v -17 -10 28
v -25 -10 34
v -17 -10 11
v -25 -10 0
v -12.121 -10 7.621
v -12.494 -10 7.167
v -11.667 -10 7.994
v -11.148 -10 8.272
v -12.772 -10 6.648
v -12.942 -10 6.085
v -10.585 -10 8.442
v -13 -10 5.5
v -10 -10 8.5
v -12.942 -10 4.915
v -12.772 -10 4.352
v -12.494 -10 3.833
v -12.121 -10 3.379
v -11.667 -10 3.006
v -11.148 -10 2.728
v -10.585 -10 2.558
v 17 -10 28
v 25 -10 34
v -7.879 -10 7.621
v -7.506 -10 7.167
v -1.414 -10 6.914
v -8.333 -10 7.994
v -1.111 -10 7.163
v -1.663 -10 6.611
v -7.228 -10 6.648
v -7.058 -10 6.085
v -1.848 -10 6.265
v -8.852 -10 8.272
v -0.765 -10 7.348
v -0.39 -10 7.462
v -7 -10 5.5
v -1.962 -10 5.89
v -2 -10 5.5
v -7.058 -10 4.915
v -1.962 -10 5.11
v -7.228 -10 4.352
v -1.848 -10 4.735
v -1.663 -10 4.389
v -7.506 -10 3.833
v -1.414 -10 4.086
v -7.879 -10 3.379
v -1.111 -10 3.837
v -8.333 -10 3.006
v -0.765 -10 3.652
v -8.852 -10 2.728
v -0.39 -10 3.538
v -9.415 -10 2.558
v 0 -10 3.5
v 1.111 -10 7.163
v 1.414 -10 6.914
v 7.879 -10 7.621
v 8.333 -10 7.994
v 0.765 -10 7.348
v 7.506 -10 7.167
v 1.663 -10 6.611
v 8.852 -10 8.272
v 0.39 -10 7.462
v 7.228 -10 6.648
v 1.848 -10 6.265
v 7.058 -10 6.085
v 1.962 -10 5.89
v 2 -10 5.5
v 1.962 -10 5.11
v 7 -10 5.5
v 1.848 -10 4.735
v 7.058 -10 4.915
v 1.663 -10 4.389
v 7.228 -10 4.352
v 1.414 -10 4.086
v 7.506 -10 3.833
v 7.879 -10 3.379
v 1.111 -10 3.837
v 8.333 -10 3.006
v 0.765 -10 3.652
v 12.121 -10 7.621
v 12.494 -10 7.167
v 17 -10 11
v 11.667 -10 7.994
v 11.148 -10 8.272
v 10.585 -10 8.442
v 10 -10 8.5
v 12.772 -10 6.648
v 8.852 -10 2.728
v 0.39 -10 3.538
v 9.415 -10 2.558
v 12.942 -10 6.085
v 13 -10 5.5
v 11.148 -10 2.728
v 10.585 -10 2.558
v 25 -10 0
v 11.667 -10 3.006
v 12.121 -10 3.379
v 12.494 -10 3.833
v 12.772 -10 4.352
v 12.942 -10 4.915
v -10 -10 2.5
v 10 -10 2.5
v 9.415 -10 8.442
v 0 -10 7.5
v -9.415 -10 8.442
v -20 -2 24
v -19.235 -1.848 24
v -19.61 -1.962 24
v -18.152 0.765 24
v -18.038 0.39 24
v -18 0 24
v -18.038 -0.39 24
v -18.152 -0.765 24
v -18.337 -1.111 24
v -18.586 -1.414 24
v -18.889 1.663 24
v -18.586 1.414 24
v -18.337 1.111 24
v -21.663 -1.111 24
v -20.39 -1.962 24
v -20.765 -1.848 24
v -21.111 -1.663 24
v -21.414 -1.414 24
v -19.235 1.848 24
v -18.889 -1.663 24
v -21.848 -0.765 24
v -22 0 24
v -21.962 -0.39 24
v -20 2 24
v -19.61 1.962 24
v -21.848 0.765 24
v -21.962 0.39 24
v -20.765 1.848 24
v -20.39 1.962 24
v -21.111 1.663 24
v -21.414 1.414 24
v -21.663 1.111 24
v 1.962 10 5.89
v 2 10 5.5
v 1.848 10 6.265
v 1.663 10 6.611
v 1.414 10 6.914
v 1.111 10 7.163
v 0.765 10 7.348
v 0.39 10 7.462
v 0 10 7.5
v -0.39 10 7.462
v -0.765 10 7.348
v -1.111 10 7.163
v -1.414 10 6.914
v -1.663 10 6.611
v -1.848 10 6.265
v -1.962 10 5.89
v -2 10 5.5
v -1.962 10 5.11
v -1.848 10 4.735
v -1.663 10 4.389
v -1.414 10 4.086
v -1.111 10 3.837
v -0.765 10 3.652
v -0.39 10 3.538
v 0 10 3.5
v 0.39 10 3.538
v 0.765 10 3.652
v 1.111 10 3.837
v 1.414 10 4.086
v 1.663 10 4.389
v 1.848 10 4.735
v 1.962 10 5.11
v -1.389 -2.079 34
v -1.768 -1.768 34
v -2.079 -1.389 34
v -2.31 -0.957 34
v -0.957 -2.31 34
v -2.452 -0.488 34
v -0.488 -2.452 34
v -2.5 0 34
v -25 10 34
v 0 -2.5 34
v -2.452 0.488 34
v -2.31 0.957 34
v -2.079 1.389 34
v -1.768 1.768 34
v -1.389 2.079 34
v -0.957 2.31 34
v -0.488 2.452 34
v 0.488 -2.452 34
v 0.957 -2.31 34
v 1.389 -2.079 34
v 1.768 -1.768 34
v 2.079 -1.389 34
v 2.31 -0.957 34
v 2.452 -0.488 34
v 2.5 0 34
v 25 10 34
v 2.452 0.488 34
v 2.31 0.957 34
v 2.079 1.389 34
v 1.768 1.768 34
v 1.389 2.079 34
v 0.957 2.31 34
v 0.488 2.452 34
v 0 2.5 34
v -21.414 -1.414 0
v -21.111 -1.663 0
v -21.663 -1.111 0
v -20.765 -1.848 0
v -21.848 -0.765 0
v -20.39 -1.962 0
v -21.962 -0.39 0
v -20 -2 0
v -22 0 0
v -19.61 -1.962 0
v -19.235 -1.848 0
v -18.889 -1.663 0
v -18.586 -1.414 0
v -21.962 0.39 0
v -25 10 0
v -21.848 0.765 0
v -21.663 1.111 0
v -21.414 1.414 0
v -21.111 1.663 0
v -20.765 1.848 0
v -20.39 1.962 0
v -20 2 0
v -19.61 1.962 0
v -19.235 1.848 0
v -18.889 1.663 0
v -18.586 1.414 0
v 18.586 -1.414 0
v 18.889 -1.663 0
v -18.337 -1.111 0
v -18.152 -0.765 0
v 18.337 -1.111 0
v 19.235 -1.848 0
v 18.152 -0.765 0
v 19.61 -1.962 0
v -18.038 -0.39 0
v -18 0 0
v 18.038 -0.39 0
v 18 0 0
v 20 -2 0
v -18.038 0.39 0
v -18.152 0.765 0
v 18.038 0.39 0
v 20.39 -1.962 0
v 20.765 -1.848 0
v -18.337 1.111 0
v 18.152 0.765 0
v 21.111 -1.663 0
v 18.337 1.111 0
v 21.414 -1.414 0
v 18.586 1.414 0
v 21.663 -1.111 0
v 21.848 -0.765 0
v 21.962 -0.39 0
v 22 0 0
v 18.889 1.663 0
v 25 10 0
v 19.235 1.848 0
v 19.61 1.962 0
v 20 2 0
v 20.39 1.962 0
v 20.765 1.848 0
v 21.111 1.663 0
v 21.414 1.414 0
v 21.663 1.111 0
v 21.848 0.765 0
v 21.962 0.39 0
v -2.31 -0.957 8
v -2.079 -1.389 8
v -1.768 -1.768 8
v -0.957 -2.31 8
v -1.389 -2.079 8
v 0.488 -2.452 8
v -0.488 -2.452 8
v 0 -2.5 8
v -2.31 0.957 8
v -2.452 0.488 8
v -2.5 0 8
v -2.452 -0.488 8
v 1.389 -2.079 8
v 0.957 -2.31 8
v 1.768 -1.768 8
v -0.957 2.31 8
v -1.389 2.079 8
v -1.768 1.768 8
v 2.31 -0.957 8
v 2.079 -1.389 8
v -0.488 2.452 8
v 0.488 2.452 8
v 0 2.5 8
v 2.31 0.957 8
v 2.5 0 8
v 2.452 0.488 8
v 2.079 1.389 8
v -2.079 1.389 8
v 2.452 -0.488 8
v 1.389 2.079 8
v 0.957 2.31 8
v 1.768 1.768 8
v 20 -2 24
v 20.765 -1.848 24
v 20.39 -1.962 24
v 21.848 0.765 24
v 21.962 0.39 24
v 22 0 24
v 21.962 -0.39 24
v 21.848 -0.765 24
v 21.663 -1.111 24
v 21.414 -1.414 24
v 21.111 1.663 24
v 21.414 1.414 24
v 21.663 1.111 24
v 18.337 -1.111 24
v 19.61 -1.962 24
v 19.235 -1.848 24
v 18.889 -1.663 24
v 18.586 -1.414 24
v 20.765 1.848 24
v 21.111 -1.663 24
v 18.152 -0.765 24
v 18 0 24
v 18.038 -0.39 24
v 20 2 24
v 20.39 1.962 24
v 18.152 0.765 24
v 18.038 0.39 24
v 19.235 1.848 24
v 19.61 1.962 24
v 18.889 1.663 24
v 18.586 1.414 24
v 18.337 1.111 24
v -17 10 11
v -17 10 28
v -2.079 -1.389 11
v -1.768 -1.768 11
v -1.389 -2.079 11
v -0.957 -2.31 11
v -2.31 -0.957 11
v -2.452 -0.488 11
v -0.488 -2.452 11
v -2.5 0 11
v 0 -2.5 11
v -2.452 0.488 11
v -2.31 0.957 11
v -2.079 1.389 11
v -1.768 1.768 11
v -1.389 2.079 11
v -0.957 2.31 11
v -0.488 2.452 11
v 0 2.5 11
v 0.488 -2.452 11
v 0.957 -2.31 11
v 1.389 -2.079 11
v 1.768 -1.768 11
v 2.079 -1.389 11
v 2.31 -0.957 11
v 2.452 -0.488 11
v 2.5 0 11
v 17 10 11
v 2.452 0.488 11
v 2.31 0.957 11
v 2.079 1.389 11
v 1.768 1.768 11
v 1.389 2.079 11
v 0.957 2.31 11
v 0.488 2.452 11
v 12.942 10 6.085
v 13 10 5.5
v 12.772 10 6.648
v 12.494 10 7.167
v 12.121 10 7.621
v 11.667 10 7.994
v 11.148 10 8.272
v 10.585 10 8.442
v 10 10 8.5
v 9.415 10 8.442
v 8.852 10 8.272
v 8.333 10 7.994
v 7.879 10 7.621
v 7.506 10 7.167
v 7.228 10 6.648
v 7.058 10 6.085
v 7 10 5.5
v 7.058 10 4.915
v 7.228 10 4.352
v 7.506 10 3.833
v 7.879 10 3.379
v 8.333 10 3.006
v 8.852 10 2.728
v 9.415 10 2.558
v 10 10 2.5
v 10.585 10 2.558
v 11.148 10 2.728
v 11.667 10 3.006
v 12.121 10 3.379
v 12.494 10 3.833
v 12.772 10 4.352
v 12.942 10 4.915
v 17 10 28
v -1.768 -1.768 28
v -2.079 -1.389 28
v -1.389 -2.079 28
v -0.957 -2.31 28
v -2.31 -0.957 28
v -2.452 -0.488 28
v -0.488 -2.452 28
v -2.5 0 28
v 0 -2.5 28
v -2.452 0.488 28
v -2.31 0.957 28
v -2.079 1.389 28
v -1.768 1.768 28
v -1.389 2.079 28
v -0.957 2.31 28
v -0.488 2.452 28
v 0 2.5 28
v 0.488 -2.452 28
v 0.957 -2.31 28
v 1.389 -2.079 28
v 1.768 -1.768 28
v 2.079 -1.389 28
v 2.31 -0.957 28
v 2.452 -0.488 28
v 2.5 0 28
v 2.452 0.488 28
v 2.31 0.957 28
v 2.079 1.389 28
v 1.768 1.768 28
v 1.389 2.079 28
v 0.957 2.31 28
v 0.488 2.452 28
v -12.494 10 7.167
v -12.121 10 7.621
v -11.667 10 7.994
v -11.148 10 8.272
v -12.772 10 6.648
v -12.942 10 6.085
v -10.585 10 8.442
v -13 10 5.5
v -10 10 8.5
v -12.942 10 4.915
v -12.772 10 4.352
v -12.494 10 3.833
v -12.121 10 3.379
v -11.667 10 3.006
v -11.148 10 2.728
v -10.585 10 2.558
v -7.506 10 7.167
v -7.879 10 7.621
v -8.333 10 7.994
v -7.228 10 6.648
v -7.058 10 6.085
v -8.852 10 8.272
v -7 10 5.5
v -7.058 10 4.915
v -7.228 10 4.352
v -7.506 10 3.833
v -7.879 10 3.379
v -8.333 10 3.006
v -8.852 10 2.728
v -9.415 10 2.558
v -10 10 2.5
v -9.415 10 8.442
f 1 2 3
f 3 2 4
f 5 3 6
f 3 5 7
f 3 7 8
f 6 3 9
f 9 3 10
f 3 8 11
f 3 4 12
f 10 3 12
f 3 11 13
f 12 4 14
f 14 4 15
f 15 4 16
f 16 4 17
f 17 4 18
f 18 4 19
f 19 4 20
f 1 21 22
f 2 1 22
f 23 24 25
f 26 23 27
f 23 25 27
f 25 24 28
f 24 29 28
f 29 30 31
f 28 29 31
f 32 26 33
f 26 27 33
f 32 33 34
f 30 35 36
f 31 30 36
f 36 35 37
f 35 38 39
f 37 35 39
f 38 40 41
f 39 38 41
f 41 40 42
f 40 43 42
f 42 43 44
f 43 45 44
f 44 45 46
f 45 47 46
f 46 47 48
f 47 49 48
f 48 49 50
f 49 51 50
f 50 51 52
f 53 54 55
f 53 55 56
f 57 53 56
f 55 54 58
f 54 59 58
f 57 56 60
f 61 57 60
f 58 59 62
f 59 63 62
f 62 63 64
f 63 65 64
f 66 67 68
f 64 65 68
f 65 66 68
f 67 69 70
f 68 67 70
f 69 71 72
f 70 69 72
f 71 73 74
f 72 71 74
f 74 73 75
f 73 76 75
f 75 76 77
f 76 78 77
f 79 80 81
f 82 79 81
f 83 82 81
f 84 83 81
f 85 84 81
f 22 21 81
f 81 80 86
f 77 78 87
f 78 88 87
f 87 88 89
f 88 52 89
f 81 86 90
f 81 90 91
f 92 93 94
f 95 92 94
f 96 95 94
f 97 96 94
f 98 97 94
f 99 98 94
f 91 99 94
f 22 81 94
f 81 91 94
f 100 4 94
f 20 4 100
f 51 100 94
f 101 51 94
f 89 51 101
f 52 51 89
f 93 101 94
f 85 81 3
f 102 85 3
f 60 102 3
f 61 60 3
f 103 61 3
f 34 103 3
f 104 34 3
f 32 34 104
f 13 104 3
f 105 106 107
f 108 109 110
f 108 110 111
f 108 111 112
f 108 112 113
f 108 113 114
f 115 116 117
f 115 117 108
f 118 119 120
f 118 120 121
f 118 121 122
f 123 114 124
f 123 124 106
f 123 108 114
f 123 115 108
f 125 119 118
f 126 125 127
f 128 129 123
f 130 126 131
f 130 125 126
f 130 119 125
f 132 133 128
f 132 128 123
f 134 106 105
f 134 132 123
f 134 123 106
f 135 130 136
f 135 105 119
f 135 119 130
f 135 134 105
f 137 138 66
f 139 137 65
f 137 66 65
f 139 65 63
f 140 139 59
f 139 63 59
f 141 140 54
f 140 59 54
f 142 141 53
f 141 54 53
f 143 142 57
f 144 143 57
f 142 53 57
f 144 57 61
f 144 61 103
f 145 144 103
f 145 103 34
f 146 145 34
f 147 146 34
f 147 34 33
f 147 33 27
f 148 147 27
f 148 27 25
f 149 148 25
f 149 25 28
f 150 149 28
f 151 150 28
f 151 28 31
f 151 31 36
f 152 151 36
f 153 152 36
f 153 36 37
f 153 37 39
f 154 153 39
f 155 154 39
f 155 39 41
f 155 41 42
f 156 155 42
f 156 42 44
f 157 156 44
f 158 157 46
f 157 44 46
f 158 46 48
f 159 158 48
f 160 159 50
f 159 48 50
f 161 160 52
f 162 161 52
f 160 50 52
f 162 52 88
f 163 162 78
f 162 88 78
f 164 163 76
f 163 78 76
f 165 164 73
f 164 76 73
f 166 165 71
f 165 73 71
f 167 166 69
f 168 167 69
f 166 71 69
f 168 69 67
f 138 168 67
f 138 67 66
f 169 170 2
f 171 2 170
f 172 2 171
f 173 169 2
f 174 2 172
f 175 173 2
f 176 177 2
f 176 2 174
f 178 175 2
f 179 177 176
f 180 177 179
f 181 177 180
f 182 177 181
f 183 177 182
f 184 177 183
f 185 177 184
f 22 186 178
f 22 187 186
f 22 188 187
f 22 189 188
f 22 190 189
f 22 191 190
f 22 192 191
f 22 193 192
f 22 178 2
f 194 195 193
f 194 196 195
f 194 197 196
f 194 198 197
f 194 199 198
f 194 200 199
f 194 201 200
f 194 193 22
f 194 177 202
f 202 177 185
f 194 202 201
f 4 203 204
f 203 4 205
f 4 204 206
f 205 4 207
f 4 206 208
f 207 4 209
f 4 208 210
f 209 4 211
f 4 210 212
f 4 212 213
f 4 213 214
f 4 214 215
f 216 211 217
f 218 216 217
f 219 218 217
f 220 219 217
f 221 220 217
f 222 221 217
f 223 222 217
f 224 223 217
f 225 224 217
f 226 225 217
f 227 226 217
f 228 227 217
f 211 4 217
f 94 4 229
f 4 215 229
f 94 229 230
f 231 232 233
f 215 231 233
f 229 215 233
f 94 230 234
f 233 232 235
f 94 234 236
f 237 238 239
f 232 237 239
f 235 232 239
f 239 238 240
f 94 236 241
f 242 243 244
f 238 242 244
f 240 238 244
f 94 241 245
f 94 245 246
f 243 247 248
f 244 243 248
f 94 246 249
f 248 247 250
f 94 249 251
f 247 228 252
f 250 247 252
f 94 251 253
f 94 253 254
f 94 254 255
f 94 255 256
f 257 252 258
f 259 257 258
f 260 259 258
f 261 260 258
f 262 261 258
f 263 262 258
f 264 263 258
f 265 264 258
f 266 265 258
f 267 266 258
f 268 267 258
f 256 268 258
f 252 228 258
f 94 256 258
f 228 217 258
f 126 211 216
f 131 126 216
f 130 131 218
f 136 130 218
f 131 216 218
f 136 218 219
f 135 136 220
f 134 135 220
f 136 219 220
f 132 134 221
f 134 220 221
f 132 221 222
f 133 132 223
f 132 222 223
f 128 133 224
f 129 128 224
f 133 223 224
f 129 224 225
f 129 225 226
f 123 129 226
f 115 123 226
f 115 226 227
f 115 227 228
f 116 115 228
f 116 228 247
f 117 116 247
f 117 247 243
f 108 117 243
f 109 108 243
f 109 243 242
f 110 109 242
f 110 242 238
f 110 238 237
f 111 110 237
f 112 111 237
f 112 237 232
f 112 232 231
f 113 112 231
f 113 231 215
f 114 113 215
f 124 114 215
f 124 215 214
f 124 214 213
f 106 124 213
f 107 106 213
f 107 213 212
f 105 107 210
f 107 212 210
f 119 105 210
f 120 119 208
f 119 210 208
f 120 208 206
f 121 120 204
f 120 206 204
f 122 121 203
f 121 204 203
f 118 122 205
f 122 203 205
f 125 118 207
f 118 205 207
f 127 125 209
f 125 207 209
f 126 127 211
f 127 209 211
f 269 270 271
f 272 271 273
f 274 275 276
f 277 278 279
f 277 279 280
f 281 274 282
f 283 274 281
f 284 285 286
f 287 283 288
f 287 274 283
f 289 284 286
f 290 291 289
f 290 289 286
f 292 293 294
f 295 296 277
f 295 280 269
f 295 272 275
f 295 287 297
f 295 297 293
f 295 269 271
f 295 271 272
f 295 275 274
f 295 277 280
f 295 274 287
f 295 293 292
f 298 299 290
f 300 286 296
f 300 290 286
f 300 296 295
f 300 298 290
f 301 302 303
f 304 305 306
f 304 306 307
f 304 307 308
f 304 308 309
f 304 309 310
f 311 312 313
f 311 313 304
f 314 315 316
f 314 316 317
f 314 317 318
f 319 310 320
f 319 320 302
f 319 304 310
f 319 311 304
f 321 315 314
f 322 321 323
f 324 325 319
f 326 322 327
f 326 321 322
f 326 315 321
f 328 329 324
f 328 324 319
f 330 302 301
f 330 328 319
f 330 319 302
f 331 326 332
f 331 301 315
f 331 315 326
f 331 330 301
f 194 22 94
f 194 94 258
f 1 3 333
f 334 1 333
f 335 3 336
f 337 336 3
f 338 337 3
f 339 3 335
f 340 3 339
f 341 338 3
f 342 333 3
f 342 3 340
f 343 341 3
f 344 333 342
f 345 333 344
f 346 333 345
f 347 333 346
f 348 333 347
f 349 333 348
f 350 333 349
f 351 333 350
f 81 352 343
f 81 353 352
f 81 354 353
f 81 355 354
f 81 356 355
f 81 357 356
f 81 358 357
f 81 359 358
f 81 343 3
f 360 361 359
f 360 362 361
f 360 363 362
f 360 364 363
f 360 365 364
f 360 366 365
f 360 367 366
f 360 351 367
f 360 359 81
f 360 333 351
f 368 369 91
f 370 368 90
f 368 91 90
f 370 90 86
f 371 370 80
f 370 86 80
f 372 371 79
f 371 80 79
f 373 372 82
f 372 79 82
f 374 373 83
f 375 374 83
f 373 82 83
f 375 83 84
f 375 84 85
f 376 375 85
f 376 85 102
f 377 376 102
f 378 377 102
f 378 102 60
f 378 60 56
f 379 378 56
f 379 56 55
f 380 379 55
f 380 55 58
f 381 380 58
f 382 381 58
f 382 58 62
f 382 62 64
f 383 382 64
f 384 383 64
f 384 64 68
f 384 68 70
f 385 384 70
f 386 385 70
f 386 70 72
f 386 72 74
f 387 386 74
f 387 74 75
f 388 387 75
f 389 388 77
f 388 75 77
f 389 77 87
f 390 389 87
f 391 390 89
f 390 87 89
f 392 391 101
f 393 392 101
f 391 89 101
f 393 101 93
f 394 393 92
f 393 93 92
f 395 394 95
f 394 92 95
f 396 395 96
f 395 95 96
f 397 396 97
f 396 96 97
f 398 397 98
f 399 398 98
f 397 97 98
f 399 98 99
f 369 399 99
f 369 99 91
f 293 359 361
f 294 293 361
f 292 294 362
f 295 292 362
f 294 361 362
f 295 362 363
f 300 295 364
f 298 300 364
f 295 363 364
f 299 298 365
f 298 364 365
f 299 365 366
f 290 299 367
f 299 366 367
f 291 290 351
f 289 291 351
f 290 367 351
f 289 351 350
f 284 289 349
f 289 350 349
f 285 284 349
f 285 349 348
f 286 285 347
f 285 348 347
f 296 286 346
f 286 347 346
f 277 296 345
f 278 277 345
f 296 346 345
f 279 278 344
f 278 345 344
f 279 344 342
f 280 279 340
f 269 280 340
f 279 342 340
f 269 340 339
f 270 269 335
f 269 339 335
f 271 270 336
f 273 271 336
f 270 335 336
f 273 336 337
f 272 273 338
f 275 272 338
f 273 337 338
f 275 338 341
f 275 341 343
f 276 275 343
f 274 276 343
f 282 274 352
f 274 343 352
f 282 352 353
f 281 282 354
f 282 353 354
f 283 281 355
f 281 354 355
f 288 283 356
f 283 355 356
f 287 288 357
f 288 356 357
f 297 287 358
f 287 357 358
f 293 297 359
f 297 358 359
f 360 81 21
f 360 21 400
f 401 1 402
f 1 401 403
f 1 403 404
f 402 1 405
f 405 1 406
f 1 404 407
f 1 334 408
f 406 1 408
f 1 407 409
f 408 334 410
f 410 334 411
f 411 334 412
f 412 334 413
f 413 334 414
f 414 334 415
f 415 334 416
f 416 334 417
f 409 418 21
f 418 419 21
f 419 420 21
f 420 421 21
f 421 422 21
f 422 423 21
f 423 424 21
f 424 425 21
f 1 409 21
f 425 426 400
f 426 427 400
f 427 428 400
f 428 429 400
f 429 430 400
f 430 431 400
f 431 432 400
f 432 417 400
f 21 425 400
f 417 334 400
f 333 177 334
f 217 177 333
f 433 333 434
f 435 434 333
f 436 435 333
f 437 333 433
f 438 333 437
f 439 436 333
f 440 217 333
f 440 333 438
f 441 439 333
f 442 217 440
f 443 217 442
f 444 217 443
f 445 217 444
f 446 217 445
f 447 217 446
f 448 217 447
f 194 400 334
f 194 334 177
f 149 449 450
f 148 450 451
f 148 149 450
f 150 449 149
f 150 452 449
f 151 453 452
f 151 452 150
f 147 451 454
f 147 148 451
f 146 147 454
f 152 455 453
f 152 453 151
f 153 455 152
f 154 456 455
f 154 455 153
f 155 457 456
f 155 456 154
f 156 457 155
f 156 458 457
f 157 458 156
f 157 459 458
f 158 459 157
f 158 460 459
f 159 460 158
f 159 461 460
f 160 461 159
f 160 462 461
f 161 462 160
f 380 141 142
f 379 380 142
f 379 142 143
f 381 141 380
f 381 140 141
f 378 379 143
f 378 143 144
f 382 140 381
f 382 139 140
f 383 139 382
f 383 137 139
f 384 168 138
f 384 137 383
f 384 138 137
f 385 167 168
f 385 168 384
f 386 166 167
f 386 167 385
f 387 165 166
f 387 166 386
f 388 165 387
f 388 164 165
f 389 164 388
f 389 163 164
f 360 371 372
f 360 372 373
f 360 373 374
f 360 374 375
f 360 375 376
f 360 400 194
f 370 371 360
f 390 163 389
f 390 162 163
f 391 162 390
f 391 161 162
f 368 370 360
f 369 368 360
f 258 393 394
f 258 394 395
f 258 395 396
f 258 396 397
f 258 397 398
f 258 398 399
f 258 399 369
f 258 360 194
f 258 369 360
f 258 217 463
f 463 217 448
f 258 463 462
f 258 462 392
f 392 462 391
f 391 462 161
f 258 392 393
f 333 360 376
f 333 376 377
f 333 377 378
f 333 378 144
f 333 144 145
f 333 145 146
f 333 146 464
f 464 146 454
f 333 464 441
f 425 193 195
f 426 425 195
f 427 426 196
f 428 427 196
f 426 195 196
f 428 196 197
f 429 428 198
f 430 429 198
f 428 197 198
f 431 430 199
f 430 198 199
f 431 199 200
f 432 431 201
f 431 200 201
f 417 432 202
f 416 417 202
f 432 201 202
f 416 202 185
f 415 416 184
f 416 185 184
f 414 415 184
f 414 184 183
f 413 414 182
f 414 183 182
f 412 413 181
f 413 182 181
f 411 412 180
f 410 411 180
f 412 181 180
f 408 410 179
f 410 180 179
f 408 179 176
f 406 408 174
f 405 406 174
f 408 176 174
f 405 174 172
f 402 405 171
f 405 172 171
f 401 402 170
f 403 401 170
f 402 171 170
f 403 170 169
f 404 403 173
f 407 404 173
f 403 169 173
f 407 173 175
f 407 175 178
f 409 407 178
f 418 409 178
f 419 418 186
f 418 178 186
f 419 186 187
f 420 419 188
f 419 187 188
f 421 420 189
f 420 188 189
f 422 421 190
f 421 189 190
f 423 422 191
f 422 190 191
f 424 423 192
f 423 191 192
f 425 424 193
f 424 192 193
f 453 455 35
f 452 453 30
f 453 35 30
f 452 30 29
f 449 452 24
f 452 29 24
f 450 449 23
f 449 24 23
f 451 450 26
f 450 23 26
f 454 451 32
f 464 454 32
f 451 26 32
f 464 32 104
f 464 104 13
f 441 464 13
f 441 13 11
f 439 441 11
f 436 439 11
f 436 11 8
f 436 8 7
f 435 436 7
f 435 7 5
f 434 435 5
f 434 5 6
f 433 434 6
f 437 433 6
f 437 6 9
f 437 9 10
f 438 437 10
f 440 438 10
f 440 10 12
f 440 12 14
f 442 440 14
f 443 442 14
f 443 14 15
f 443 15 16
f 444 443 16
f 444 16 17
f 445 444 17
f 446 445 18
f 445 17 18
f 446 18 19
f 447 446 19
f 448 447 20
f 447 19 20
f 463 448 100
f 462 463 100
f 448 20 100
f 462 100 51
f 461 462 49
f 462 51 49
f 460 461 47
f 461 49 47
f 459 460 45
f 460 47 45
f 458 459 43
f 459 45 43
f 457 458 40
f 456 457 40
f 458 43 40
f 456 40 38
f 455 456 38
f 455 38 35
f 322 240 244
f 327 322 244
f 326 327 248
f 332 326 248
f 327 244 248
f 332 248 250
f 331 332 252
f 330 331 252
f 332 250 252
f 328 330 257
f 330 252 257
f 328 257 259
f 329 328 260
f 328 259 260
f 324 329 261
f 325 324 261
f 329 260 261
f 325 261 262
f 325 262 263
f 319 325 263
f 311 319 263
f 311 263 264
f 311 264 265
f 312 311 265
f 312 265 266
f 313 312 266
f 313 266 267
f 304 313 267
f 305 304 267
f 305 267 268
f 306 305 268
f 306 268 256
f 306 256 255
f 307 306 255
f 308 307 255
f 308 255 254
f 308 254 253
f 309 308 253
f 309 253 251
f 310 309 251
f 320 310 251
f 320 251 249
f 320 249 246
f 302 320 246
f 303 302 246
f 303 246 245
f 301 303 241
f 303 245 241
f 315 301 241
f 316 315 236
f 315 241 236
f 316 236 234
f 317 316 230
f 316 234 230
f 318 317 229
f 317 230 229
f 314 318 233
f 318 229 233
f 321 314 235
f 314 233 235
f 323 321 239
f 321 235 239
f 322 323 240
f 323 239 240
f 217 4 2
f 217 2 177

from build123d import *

# Parameters (mm, degrees)
SKETCH1_W                = 50
SKETCH1_H                = 20
BOSS_EXTRUDE1_DEPTH      = 11
SKETCH2_R                = 2
CUT_EXTRUDE1_DEPTH       = 11
SKETCH3_R                = 2
CUT_EXTRUDE2_DEPTH       = 21
SKETCH4_R                = 3
CUT_EXTRUDE3_DEPTH       = 21
SKETCH5_W                = 8
SKETCH5_H                = 20
BOSS_EXTRUDE2_DEPTH      = 22
SKETCH13_R               = 2.5
CUT_EXTRUDE6_DEPTH       = 3
SKETCH14_W               = 50
SKETCH14_H               = 20
BOSS_EXTRUDE4_DEPTH      = 1
BOSS_EXTRUDE4_DEPTH_BACK = 5
SKETCH15_R               = 2.5
CUT_EXTRUDE7_DEPTH       = 6
SKETCH18_R               = 2
CUT_EXTRUDE8_DEPTH       = 13


with BuildPart() as part:
    # Sketch1 → Boss-Extrude1 (new body)
    with BuildSketch(Plane.XY):
        Rectangle(SKETCH1_W, SKETCH1_H)
    extrude(amount=BOSS_EXTRUDE1_DEPTH)

    # Sketch2 → Cut-Extrude1 (cut)
    with BuildSketch(Plane(origin=(0, 0, 0), x_dir=(-1, 0, 0), z_dir=(0, 0, -1))):
        with Locations((-20, 0)):
            Circle(SKETCH2_R)
        with Locations((20, 0)):
            Circle(SKETCH2_R)
    extrude(amount=-CUT_EXTRUDE1_DEPTH, mode=Mode.SUBTRACT)

    # Sketch3 → Cut-Extrude2 (cut, through all)
    with BuildSketch(Plane.XZ.offset(10)):
        with Locations((0, 5.5)):
            Circle(SKETCH3_R)
    extrude(amount=-CUT_EXTRUDE2_DEPTH, mode=Mode.SUBTRACT)

    # Sketch4 → Cut-Extrude3 (cut, through all)
    with BuildSketch(Plane.XZ.offset(10)):
        with Locations((-10, 5.5)):
            Circle(SKETCH4_R)
        with Locations((10, 5.5)):
            Circle(SKETCH4_R)
    extrude(amount=-CUT_EXTRUDE3_DEPTH, mode=Mode.SUBTRACT)

    # Sketch5 → Boss-Extrude2 (add)
    with BuildSketch(Plane.XY.offset(11)):
        with Locations((-21, 0)):
            Rectangle(SKETCH5_W, SKETCH5_H)
        with Locations((21, 0)):
            Rectangle(SKETCH5_W, SKETCH5_H)
    extrude(amount=BOSS_EXTRUDE2_DEPTH)

    # Sketch13 → Cut-Extrude6 (cut)
    with BuildSketch(Plane.XY.offset(11)):
        Circle(SKETCH13_R)
    extrude(amount=-CUT_EXTRUDE6_DEPTH, mode=Mode.SUBTRACT)

    # Sketch14 → Boss-Extrude4 (add, two sides)
    with BuildSketch(Plane.XY.offset(33)) as boss_extrude4_sk:
        Rectangle(SKETCH14_W, SKETCH14_H)
    extrude(amount=BOSS_EXTRUDE4_DEPTH)
    extrude(boss_extrude4_sk.sketch, amount=-BOSS_EXTRUDE4_DEPTH_BACK)

    # Sketch15 → Cut-Extrude7 (cut)
    with BuildSketch(Plane.XY.offset(34)):
        Circle(SKETCH15_R)
    extrude(amount=-CUT_EXTRUDE7_DEPTH, mode=Mode.SUBTRACT)

    # Sketch18 → Cut-Extrude8 (cut)
    with BuildSketch(Plane(origin=(0, 0, 11), x_dir=(-1, 0, 0), z_dir=(0, 0, -1))):
        with Locations((-20, 0)):
            Circle(SKETCH18_R)
        with Locations((20, 0)):
            Circle(SKETCH18_R)
    extrude(amount=-CUT_EXTRUDE8_DEPTH, mode=Mode.SUBTRACT)


solid = part.part
